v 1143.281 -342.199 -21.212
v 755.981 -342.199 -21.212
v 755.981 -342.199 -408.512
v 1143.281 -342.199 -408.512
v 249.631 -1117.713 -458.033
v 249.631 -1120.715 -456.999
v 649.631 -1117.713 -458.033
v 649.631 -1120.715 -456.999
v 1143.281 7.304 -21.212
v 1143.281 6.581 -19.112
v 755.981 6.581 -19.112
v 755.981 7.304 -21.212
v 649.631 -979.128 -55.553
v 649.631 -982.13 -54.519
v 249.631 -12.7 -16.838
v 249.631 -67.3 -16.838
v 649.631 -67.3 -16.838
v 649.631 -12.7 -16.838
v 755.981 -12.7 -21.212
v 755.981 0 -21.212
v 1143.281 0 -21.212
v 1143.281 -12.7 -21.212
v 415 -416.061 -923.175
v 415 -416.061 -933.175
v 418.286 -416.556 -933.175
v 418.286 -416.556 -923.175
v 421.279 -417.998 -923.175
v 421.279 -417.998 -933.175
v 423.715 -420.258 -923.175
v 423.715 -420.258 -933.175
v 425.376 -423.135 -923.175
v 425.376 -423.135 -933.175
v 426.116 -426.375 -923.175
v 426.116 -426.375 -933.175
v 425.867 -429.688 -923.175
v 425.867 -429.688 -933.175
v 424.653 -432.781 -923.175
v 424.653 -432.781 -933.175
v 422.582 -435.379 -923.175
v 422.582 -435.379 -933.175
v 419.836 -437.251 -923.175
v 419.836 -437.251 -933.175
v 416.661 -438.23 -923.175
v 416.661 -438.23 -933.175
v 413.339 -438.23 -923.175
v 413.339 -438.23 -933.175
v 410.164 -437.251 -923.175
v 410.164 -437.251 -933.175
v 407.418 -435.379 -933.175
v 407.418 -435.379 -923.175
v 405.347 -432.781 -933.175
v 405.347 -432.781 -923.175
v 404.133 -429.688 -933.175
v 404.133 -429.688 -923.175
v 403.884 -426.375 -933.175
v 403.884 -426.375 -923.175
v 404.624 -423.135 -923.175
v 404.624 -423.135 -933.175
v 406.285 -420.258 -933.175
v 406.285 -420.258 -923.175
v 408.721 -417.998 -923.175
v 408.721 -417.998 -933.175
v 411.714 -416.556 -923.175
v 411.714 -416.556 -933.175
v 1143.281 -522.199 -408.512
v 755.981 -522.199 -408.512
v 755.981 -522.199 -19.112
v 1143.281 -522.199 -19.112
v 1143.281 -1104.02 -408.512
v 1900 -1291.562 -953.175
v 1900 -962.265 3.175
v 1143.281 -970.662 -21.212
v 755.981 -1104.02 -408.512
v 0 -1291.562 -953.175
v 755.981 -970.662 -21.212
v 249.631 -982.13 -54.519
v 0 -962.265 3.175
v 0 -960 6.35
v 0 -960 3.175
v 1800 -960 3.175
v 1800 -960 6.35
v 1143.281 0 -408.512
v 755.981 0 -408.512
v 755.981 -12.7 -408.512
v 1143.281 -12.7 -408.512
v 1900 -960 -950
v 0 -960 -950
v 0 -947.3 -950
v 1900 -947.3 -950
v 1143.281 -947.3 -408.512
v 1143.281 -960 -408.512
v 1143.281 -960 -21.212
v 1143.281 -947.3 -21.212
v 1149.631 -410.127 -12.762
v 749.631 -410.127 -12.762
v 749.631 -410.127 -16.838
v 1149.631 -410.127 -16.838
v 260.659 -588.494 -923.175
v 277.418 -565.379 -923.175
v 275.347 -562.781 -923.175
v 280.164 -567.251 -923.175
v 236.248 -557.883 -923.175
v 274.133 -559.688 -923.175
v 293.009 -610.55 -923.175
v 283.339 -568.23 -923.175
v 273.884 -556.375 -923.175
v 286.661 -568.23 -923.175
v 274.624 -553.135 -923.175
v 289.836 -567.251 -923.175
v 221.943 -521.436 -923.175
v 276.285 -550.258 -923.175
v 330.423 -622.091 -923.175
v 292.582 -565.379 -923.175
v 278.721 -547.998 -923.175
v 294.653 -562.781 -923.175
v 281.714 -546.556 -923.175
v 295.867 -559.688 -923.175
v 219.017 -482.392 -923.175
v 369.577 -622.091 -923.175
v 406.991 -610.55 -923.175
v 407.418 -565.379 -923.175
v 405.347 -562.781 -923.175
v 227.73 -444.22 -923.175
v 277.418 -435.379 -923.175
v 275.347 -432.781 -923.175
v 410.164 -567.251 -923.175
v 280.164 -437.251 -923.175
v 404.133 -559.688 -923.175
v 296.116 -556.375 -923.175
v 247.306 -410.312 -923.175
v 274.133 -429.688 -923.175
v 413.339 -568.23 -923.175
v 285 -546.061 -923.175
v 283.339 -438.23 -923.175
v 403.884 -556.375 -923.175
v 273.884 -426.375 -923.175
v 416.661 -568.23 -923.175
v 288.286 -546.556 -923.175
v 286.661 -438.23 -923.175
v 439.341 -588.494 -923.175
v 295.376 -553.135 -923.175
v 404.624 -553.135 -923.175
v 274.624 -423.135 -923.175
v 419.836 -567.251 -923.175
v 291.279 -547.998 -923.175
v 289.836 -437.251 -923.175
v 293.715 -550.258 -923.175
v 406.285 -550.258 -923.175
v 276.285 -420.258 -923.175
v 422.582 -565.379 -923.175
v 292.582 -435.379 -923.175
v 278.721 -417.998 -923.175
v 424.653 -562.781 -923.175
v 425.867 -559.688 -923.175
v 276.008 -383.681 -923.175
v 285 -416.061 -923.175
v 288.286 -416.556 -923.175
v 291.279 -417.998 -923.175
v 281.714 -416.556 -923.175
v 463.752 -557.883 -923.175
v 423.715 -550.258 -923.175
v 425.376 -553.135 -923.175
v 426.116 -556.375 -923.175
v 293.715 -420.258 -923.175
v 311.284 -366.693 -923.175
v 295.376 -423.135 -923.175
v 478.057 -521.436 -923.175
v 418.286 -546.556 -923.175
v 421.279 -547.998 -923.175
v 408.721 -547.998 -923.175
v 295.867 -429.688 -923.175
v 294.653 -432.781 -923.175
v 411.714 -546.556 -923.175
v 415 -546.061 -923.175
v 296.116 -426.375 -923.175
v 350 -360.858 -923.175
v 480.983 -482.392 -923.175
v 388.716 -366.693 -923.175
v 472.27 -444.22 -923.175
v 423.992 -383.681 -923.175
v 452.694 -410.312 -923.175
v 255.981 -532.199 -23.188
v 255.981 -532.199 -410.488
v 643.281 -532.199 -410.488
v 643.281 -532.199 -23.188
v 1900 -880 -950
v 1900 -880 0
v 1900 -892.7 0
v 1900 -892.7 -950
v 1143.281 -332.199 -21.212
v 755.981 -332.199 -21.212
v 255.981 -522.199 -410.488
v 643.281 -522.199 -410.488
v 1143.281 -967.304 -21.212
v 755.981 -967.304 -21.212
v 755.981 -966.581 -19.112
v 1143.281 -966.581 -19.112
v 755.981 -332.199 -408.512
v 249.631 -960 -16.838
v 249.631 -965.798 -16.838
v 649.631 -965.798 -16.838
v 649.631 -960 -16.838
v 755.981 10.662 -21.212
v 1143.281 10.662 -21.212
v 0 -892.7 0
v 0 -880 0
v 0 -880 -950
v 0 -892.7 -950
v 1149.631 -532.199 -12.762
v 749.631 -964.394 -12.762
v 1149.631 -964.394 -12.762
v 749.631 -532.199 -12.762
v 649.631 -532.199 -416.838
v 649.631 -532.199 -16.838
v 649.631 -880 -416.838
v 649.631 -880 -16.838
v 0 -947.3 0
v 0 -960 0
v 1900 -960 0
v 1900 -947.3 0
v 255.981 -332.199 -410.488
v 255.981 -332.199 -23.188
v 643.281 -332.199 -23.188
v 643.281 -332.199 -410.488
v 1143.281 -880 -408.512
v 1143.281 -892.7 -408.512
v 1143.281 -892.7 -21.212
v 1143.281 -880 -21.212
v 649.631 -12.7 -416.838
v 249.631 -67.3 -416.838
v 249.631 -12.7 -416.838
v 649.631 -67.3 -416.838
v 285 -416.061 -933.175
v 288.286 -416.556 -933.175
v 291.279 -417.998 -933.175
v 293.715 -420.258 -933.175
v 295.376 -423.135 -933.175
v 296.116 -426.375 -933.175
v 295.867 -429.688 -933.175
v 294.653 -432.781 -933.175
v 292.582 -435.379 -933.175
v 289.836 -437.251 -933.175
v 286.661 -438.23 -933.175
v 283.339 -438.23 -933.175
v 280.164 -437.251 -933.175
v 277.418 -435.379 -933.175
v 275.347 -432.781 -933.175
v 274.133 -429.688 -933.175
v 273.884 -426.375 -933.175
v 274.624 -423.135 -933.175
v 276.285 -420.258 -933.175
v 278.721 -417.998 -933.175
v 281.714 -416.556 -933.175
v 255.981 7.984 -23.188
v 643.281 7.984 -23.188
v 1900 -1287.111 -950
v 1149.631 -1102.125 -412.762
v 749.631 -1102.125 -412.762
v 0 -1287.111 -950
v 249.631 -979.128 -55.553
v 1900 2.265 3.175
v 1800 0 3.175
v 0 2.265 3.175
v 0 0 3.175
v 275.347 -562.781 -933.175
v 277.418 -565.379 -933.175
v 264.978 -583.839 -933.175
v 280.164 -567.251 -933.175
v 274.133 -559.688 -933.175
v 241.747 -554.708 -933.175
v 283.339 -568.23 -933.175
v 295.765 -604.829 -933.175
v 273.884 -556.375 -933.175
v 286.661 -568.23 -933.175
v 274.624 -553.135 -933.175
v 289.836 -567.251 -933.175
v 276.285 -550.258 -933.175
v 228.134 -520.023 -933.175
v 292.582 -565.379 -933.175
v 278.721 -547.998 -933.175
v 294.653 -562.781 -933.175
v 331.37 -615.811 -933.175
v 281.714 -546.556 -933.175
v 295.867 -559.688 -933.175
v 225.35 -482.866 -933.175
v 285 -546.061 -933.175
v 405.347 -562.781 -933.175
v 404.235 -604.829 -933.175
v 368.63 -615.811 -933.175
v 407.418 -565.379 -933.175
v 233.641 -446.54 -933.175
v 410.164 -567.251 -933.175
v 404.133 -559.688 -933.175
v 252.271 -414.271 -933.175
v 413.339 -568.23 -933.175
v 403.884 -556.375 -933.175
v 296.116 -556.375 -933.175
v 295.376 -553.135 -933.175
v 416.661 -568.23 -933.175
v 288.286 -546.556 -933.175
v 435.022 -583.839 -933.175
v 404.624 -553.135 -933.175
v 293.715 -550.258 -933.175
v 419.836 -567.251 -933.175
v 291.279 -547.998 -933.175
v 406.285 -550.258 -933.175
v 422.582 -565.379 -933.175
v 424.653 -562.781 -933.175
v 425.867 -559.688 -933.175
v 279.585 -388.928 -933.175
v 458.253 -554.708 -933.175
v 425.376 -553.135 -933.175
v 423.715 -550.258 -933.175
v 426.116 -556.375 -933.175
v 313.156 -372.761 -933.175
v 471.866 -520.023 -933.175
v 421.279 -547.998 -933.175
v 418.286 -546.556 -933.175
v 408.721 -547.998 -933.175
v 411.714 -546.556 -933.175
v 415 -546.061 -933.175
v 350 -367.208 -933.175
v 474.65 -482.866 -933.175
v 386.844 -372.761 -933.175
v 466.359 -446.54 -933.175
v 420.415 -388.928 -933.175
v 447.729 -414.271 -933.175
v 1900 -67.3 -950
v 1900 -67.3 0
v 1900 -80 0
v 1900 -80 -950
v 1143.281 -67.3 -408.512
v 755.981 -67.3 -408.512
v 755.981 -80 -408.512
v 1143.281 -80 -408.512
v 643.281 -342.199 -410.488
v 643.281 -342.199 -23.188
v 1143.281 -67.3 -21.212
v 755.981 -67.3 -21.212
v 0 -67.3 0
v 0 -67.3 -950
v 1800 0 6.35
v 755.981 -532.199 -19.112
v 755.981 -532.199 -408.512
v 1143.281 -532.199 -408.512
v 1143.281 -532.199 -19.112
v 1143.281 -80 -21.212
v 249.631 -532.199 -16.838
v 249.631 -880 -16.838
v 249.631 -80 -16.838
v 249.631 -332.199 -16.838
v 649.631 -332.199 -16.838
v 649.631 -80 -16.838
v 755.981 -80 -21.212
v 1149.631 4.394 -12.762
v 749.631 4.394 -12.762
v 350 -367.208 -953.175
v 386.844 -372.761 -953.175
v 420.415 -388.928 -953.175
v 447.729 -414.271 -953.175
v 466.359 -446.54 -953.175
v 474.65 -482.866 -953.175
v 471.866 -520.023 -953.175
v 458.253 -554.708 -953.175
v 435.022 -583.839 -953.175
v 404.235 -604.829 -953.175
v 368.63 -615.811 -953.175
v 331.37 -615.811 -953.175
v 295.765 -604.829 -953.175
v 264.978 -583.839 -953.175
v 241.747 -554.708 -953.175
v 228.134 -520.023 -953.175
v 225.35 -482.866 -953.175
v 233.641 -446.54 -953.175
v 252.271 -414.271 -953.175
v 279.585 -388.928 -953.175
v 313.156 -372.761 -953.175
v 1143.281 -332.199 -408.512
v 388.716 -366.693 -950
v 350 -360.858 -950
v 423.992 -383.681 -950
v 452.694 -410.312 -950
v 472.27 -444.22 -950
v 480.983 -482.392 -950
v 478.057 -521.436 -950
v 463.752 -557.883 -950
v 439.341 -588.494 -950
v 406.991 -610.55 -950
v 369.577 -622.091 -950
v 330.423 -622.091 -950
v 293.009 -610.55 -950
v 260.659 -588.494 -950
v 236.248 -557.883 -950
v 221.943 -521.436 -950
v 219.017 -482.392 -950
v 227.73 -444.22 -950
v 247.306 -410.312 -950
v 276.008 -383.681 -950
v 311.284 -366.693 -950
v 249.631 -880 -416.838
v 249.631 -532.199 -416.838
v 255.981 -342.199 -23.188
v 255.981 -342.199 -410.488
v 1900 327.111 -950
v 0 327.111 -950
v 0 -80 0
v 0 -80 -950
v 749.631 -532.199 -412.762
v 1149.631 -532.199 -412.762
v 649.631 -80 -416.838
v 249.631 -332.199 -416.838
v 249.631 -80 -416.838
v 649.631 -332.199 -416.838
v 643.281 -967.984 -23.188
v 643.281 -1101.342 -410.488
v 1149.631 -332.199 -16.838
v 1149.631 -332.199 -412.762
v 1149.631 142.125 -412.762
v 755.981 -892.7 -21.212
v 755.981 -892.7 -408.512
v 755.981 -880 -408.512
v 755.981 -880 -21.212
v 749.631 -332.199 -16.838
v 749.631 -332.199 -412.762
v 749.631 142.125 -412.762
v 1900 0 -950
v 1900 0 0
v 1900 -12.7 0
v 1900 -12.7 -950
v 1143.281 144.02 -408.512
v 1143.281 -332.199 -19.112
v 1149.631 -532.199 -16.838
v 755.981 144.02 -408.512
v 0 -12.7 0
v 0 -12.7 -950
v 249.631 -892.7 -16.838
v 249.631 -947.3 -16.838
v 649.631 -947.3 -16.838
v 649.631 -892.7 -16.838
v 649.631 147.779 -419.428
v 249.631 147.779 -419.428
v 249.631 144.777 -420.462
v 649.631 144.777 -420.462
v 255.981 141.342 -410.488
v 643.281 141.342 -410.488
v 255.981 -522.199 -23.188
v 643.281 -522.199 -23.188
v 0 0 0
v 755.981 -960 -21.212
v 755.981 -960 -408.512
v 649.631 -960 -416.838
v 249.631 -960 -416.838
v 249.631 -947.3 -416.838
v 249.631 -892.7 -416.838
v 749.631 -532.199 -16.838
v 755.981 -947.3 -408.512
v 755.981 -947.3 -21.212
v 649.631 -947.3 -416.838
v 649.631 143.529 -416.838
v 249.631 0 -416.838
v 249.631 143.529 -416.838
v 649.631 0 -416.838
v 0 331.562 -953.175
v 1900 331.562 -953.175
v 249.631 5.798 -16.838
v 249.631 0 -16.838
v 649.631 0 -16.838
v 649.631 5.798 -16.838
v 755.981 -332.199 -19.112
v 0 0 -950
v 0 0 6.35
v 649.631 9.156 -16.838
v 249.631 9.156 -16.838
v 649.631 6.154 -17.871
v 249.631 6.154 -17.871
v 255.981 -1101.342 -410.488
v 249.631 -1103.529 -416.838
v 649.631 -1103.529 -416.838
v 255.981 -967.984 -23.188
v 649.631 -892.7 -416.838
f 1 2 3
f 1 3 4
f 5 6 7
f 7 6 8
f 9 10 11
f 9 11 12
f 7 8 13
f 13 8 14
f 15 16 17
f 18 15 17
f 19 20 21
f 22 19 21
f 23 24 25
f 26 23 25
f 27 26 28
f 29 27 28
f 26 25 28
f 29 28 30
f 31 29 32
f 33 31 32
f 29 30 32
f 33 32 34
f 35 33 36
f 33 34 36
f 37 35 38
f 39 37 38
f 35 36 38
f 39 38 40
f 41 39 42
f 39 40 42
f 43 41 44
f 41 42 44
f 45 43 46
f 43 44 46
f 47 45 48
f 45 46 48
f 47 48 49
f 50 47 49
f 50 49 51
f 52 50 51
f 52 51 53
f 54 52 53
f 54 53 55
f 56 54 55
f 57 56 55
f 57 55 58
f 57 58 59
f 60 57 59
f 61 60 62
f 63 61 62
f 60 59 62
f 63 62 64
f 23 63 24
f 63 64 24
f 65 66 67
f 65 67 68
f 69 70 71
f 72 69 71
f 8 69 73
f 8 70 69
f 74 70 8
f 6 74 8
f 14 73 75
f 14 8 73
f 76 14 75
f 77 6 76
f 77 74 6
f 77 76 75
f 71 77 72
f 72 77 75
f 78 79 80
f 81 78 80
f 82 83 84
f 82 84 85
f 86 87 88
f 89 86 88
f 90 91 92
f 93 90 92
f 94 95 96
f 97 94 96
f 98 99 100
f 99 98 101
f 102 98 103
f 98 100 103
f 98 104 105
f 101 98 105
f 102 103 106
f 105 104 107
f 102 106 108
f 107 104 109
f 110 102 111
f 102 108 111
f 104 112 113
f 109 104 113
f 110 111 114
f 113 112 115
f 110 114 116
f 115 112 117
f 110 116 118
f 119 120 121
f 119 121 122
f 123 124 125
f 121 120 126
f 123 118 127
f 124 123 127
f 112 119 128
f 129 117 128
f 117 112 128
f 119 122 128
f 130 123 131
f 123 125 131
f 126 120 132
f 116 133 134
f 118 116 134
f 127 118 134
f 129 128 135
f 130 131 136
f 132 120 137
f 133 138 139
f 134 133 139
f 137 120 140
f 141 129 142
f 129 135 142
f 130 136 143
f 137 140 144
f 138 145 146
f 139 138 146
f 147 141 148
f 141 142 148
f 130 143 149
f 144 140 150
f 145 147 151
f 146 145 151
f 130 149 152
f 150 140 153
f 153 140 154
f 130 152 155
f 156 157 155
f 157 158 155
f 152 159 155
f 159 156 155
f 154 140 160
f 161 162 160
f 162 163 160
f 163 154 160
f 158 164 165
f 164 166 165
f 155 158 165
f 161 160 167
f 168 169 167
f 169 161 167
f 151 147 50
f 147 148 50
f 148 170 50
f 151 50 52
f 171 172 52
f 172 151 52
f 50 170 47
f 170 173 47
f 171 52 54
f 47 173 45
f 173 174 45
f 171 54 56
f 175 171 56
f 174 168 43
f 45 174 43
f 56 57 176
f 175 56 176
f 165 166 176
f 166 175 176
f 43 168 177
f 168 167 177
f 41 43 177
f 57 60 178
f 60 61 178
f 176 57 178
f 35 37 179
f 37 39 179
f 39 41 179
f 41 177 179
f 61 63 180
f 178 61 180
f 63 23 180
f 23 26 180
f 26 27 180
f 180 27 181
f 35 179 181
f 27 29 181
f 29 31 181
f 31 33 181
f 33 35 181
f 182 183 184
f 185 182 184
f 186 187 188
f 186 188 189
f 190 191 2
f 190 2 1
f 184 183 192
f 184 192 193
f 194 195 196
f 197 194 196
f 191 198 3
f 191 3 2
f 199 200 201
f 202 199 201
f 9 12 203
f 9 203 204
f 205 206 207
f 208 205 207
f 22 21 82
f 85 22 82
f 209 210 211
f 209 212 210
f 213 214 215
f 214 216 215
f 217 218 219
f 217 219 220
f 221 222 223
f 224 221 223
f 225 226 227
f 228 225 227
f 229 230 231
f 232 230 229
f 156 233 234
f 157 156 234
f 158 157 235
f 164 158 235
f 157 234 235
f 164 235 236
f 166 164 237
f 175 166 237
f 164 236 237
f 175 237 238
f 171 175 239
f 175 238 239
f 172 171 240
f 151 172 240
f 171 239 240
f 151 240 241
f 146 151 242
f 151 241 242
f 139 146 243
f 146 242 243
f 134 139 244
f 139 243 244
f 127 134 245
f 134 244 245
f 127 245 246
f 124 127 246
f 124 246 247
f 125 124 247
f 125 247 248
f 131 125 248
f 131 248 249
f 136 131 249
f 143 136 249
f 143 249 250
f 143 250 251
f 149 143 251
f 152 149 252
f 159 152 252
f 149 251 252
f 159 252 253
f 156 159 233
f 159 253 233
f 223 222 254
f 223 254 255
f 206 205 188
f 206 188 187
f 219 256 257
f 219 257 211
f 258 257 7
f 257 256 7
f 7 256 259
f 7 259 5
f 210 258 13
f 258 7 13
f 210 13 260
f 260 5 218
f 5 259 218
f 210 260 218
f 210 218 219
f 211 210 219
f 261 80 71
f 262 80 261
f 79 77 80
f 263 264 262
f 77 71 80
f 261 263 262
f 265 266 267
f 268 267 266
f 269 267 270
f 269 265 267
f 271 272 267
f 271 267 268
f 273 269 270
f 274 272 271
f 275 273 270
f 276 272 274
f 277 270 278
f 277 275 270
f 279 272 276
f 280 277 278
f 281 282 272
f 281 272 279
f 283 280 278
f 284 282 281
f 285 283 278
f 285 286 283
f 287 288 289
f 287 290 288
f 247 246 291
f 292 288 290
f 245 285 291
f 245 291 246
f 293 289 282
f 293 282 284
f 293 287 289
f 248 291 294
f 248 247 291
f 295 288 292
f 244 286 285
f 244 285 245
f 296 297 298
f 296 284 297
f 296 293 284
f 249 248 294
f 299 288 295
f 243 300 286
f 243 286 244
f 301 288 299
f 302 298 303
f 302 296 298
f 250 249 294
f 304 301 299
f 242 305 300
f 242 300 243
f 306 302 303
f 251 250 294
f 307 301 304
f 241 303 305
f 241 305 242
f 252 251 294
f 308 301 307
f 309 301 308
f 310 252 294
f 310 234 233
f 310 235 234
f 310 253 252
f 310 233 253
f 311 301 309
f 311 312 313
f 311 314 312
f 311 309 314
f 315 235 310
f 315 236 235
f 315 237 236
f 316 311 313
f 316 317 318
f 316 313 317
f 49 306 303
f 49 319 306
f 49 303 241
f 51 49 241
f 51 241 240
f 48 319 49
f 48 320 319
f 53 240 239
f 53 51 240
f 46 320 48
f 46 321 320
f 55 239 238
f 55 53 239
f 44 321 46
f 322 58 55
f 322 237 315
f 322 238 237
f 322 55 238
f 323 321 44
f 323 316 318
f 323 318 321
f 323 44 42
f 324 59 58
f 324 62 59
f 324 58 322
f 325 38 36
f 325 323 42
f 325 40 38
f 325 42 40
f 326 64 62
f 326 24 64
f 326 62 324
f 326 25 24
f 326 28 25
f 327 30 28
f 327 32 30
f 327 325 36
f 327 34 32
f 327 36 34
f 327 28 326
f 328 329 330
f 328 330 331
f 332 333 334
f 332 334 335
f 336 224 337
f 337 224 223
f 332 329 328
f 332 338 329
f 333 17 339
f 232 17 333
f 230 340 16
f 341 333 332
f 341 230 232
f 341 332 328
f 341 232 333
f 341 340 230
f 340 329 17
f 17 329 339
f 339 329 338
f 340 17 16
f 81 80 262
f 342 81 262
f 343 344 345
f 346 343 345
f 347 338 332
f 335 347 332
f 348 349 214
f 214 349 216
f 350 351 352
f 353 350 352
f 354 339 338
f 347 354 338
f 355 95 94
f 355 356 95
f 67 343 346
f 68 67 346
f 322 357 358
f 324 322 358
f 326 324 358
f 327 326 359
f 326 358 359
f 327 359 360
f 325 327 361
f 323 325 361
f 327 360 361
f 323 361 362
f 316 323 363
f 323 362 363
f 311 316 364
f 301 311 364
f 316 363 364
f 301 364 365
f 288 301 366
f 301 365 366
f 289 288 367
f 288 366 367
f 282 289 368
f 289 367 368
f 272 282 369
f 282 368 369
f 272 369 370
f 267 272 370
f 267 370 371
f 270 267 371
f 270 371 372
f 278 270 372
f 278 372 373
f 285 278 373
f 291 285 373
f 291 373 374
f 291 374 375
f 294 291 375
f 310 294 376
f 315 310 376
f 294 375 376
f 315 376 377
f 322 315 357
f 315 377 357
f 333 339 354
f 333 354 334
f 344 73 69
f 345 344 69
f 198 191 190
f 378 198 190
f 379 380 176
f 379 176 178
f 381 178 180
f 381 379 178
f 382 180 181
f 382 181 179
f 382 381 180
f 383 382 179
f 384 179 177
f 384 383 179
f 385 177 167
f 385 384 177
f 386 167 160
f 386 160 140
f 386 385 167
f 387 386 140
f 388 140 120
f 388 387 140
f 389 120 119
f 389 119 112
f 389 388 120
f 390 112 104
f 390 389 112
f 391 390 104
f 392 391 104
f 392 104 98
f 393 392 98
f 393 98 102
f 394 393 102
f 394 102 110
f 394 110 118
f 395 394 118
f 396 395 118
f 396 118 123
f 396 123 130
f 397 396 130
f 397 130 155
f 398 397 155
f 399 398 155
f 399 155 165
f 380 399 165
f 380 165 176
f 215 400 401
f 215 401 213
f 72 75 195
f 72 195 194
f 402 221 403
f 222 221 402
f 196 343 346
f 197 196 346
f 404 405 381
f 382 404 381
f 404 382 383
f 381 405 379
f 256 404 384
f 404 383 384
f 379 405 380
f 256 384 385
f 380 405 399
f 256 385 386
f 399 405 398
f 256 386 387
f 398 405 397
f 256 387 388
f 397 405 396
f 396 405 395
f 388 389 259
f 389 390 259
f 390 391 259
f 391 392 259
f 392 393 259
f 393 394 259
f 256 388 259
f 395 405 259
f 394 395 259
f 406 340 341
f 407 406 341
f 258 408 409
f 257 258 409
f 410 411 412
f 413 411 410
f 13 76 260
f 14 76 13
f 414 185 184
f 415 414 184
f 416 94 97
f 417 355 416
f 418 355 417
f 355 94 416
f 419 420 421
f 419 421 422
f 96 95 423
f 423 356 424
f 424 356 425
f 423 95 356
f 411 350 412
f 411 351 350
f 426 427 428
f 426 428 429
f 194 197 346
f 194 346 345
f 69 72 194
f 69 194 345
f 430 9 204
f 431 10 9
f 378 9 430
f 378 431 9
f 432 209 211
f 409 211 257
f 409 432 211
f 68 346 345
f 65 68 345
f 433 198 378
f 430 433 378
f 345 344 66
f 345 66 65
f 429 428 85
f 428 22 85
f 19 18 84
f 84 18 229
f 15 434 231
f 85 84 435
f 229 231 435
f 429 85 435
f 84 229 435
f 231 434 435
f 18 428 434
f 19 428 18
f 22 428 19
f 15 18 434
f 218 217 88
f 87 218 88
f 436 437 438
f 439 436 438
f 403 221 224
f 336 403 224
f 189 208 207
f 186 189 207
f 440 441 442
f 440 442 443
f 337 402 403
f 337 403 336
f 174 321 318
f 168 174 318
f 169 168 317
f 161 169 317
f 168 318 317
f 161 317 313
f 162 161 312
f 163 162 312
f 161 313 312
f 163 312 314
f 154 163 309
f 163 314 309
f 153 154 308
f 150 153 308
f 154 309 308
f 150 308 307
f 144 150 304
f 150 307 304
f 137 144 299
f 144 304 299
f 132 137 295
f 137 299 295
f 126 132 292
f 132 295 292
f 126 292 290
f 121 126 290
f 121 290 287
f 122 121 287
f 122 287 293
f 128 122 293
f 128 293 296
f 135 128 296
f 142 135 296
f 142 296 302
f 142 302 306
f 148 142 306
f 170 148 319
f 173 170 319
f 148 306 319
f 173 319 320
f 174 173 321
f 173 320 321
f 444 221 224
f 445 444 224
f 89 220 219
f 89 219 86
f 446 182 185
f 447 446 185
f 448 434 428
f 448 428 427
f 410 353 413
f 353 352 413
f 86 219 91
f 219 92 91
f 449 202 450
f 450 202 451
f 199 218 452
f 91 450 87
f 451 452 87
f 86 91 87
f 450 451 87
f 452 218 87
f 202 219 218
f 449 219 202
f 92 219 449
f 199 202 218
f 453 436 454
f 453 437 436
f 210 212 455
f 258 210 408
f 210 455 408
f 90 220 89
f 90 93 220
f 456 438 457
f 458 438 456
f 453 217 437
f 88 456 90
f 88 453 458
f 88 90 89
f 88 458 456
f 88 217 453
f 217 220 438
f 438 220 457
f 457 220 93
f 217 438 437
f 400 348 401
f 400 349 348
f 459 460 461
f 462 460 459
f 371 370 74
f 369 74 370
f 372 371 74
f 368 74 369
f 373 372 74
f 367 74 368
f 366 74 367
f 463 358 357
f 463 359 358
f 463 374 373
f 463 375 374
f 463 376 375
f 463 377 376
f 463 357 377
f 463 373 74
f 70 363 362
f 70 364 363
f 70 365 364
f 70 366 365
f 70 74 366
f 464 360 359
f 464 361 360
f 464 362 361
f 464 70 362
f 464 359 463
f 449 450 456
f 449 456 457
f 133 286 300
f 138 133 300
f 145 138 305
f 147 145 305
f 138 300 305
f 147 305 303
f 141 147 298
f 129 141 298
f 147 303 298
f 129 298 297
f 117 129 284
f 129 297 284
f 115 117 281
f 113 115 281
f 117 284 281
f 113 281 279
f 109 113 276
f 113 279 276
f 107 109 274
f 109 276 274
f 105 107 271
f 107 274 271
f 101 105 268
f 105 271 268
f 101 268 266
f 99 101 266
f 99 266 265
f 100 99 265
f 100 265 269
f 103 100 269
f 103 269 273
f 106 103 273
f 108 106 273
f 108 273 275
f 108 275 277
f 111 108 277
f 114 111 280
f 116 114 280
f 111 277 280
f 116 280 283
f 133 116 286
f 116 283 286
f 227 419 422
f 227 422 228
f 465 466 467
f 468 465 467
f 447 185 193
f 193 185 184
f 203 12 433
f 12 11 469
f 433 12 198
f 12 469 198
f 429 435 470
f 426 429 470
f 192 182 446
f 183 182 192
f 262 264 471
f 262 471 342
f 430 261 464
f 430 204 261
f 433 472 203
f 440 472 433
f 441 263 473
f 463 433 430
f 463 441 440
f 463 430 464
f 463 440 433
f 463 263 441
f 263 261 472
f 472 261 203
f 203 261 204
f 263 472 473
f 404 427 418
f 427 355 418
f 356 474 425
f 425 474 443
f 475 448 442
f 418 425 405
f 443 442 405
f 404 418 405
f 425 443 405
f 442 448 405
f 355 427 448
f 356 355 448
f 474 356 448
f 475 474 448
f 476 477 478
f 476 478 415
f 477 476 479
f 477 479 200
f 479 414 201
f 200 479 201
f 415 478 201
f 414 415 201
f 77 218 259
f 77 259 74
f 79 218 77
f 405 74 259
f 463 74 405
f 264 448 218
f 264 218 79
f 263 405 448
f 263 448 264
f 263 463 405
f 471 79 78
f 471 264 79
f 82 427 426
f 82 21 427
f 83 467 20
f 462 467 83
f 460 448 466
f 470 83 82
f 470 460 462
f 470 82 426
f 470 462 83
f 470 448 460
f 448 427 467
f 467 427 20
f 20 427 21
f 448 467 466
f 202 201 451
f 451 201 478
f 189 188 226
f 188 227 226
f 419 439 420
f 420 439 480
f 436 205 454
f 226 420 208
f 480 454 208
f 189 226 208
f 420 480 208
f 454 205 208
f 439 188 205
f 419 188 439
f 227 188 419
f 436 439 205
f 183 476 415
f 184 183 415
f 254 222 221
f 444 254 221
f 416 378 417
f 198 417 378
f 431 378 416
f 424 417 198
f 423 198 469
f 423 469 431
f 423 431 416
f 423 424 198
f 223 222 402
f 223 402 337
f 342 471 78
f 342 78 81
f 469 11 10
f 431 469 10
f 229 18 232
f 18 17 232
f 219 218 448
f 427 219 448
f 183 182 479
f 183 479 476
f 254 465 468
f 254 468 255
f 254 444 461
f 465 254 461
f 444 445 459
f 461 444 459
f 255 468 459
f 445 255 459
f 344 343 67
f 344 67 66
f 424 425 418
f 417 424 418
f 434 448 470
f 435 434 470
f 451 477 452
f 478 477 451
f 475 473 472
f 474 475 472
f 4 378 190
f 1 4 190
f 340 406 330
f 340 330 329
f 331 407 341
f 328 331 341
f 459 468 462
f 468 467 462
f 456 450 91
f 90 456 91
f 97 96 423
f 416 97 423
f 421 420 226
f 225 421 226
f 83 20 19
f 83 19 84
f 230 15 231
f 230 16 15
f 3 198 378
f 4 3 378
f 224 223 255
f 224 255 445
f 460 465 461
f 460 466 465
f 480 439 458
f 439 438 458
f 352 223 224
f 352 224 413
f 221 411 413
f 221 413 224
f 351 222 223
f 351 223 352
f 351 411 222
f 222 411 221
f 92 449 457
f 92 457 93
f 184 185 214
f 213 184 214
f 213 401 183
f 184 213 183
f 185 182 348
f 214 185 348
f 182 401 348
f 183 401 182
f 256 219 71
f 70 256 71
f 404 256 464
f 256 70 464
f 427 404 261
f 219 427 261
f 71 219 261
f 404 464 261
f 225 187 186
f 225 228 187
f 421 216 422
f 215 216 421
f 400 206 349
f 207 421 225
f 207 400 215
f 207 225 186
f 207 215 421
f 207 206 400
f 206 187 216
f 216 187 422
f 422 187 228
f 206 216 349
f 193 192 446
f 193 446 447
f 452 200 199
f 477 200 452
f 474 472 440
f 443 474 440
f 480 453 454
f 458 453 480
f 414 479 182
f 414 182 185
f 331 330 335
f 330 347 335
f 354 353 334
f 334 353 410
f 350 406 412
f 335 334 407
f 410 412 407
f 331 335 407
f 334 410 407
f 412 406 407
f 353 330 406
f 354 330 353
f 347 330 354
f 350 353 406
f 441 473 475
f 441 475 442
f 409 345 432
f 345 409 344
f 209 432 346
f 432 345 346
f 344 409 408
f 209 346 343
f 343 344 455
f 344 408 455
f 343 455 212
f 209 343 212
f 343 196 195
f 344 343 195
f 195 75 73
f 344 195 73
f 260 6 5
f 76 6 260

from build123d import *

# Parameters (mm, degrees)
SKETCH1_W                       = 1800
SKETCH1_H                       = 960
BOSS_EXTRUDE1_DEPTH             = 6.35
BOSS_EXTRUDE2_DEPTH             = 1900
SKETCH6_W                       = 400
SKETCH6_H                       = 425.788292868
CUT_EXTRUDE1_DEPTH              = 300
SKETCH7_W                       = 400
SKETCH7_H                       = 425.67110899
CUT_EXTRUDE2_DEPTH              = 300
BOSS_EXTRUDE4_REACH             = 2489.303
SKETCH8_W                       = 400
SKETCH8_H                       = 400
SKETCH8_W_2                     = 387.3
SKETCH8_H_2                     = 387.3
BOSS_EXTRUDE4_DIRECTION_2_REACH = 2489.303
SKETCH11_R                      = 131.35
BOSS_EXTRUDE6_DEPTH             = 30
SKETCH12_R                      = 125
CUT_EXTRUDE5_DEPTH              = 20
BOSS_EXTRUDE7_REACH             = 2489.303
SKETCH14_W                      = 400
SKETCH14_H                      = 400
SKETCH14_W_2                    = 387.3
SKETCH14_H_2                    = 387.3
BOSS_EXTRUDE7_DIRECTION_2_REACH = 2489.303
CUT_EXTRUDE6_START              = -1104.02001
SKETCH15_W                      = 387.3
SKETCH15_H                      = 387.3
CUT_EXTRUDE6_DEPTH              = 1248.04002
SKETCH16_W                      = 400
SKETCH16_H                      = 200
CUT_EXTRUDE8_DEPTH              = 940
SKETCH18_W                      = 4.075824643
SKETCH18_H                      = 122.071298875
CUT_EXTRUDE9_DEPTH              = 410
SKETCH19_W                      = 387.3
SKETCH19_H                      = 387.3
BOSS_EXTRUDE22_DEPTH            = 10
SKETCH22_W                      = 387.3
SKETCH22_H                      = 389.400481364
BOSS_EXTRUDE24_DEPTH            = 10
SKETCH23_W                      = 387.3
SKETCH23_H                      = 387.3
BOSS_EXTRUDE25_DEPTH            = 10
SKETCH24_W                      = 387.3
SKETCH24_H                      = 387.3
BOSS_EXTRUDE26_DEPTH            = 10
SKETCH25_W                      = 950
SKETCH25_H                      = 12.7
BOSS_EXTRUDE27_DEPTH            = 1900
SKETCH26_W                      = 387.3
SKETCH26_H                      = 387.3
CUT_EXTRUDE10_DEPTH             = 300
SKETCH27_W                      = 387.3
SKETCH27_H                      = 387.3
CUT_EXTRUDE11_DEPTH             = 300
SKETCH28_W                      = 387.3
SKETCH28_H                      = 387.3
CUT_EXTRUDE12_DEPTH             = 300
SKETCH29_W                      = 387.3
SKETCH29_H                      = 387.3
CUT_EXTRUDE13_DEPTH             = 300
SKETCH30_R                      = 11.146802018
CUT_EXTRUDE14_DEPTH             = 10


with BuildPart() as part:
    # Sketch1 → Boss-Extrude1 (new body)
    with BuildSketch(Plane.XY):
        with Locations((900, -480)):
            Rectangle(SKETCH1_W, SKETCH1_H)
    extrude(amount=BOSS_EXTRUDE1_DEPTH)

    # Sketch2 → Boss-Extrude2 (add)
    with BuildSketch(Plane(origin=(0, 0, 0), x_dir=(0, 0, -1), z_dir=(1, 0, 0))):
        Polygon((-3.175, -962.264705491), (-3.175, 2.264705491), (953.175, 331.56241846), (953.175, -1291.56241846), align=None)
        Polygon((0, 0), (950, 327.111232625), (950, -1287.111232625), (0, -960), align=None, mode=Mode.SUBTRACT)
    extrude(amount=BOSS_EXTRUDE2_DEPTH)

    # Sketch6 → Cut-Extrude1 (cut)
    with BuildSketch(Plane(origin=(0, 3.002021478, 1.03367889), x_dir=(1, 0, 0), z_dir=(0, 0.9455185755993153, 0.32556815445716086))):
        with Locations((449.631164922, 231.795224093)):
            Rectangle(SKETCH6_W, SKETCH6_H)
    extrude(amount=-CUT_EXTRUDE1_DEPTH, mode=Mode.SUBTRACT)

    # Sketch7 → Cut-Extrude2 (cut)
    with BuildSketch(Plane(origin=(0, -861.247183209, 296.551187047), x_dir=(1, 0, 0), z_dir=(0, -0.9455185755993154, 0.32556815445716053))):
        with Locations((449.631164922, -584.134563657)):
            Rectangle(SKETCH7_W, SKETCH7_H)
    extrude(amount=-CUT_EXTRUDE2_DEPTH, mode=Mode.SUBTRACT)

    # Sketch11 → Boss-Extrude6 (add)
    with BuildSketch(Plane(origin=(0, 0, -953.175), x_dir=(-1, 0, 0), z_dir=(0, 0, -1))):
        with Locations(Location((-350, -492.20758154, 0), (0, 0, 90))):
            Circle(SKETCH11_R)
    extrude(amount=-BOSS_EXTRUDE6_DEPTH)

    # Sketch12 → Cut-Extrude5 (cut)
    with BuildSketch(Plane(origin=(0, 0, -953.175), x_dir=(-1, 0, 0), z_dir=(0, 0, -1))):
        with Locations(Location((-350, -492.20758154, 0), (0, 0, 90))):
            Circle(SKETCH12_R)
    extrude(amount=-CUT_EXTRUDE5_DEPTH, mode=Mode.SUBTRACT)

    # Boss-Extrude7: up to this plane
    boss_extrude7_end = Plane(origin=(1900, 0, 0), z_dir=(0, -0.9455185755993153, -0.325568154457161))
    # Sketch14 → Boss-Extrude7 (add, up to the surface)
    with BuildSketch(Plane(origin=(0, 0, 0), x_dir=(1, 0, 0), z_dir=(0, 1, 0)), mode=Mode.PRIVATE) as boss_extrude7_sk1:
        with Locations((949.631164922, 212.761816492)):
            Rectangle(SKETCH14_W, SKETCH14_H)
        with Locations((949.631164922, 212.761816492)):
            Rectangle(SKETCH14_W_2, SKETCH14_H_2, mode=Mode.SUBTRACT)
    boss_extrude7_tool1 = split(extrude(boss_extrude7_sk1.sketch, amount=BOSS_EXTRUDE7_REACH, mode=Mode.PRIVATE), bisect_by=boss_extrude7_end, keep=Keep.BOTH, mode=Mode.PRIVATE)
    add(boss_extrude7_tool1.solids().sort_by_distance((949.631165, 0, -407.104962))[0])

    # Boss-Extrude7 direction 2: up to this plane
    boss_extrude7_direction_2_end = Plane(origin=(1900, -1287.111232625, -950), z_dir=(0, 0.9455185755993156, -0.3255681544571603))
    # Sketch14 → Boss-Extrude7 direction 2 (add, up to the surface)
    with BuildSketch(Plane(origin=(0, 0, 0), x_dir=(1, 0, 0), z_dir=(0, 1, 0)), mode=Mode.PRIVATE) as boss_extrude7_direction_2_sk1:
        with Locations((949.631164922, 212.761816492)):
            Rectangle(SKETCH14_W, SKETCH14_H)
        with Locations((949.631164922, 212.761816492)):
            Rectangle(SKETCH14_W_2, SKETCH14_H_2, mode=Mode.SUBTRACT)
    boss_extrude7_direction_2_tool1 = split(extrude(boss_extrude7_direction_2_sk1.sketch, amount=-BOSS_EXTRUDE7_DIRECTION_2_REACH, mode=Mode.PRIVATE), bisect_by=boss_extrude7_direction_2_end, keep=Keep.BOTH, mode=Mode.PRIVATE)
    add(boss_extrude7_direction_2_tool1.solids().sort_by_distance((949.631165, 0, -407.104962))[0])

    # Sketch15 → Cut-Extrude6 (cut)
    with BuildSketch(Plane(origin=(0, 0, 0), x_dir=(1, 0, 0), z_dir=(0, 1, 0)).offset(CUT_EXTRUDE6_START)):
        with Locations((949.631164922, 214.862297856)):
            Rectangle(SKETCH15_W, SKETCH15_H)
    extrude(amount=CUT_EXTRUDE6_DEPTH, mode=Mode.SUBTRACT)


with BuildPart() as body_2:
    # Boss-Extrude4: up to this plane
    boss_extrude4_end = Plane(origin=(1900, -1287.111232625, -950), z_dir=(0, 0.9455185755993156, -0.3255681544571603))
    # Sketch8 → Boss-Extrude4 (new, up to the surface)
    with BuildSketch(Plane(origin=(0, 0, 0), x_dir=(1, 0, 0), z_dir=(0, 1, 0)), mode=Mode.PRIVATE) as boss_extrude4_sk1:
        with Locations((449.631164922, 216.837641135)):
            Rectangle(SKETCH8_W, SKETCH8_H)
        with Locations((449.631164922, 216.837641135)):
            Rectangle(SKETCH8_W_2, SKETCH8_H_2, mode=Mode.SUBTRACT)
    boss_extrude4_tool1 = split(extrude(boss_extrude4_sk1.sketch, amount=-BOSS_EXTRUDE4_REACH, mode=Mode.PRIVATE), bisect_by=boss_extrude4_end, keep=Keep.BOTH, mode=Mode.PRIVATE)
    add(boss_extrude4_tool1.solids().sort_by_distance((449.631165, 0, -22.494495))[0])

    # Boss-Extrude4 direction 2: up to this plane
    boss_extrude4_direction_2_end = Plane(origin=(1900, 0, 0), z_dir=(0, -0.9455185755993153, -0.325568154457161))
    # Sketch8 → Boss-Extrude4 direction 2 (add, up to the surface)
    with BuildSketch(Plane(origin=(0, 0, 0), x_dir=(1, 0, 0), z_dir=(0, 1, 0)), mode=Mode.PRIVATE) as boss_extrude4_direction_2_sk1:
        with Locations((449.631164922, 216.837641135)):
            Rectangle(SKETCH8_W, SKETCH8_H)
        with Locations((449.631164922, 216.837641135)):
            Rectangle(SKETCH8_W_2, SKETCH8_H_2, mode=Mode.SUBTRACT)
    boss_extrude4_direction_2_tool1 = split(extrude(boss_extrude4_direction_2_sk1.sketch, amount=BOSS_EXTRUDE4_DIRECTION_2_REACH, mode=Mode.PRIVATE), bisect_by=boss_extrude4_direction_2_end, keep=Keep.BOTH, mode=Mode.PRIVATE)
    add(boss_extrude4_direction_2_tool1.solids().sort_by_distance((449.631165, 0, -22.494495))[0])


with BuildPart() as cut_extrude8_tool:
    # Sketch16 → Cut-Extrude8 (new body)
    with BuildSketch(Plane.ZY.offset(-249.631164922)):
        with Locations((-216.837641135, -432.198710101)):
            Rectangle(SKETCH16_W, SKETCH16_H)
    extrude(amount=-CUT_EXTRUDE8_DEPTH)


with BuildPart() as part_1:
    add(part.part)

    # Cut-Extrude8: cut by cut_extrude8_tool
    add(cut_extrude8_tool.part, mode=Mode.SUBTRACT)

    # Sketch18 → Cut-Extrude9 (cut)
    with BuildSketch(Plane(origin=(1149.631164922, 0, 0), x_dir=(0, 0, -1), z_dir=(1, 0, 0))):
        with Locations((14.799728814, -471.163060664)):
            Rectangle(SKETCH18_W, SKETCH18_H)
    extrude(amount=-CUT_EXTRUDE9_DEPTH, mode=Mode.SUBTRACT)

    # Sketch30 → Cut-Extrude14 (cut)
    with BuildSketch(Plane(origin=(0, 0, -933.175), x_dir=(-1, 0, 0), z_dir=(0, 0, -1))):
        with Locations(Location((-285, -427.20758154, 0), (0, 0, 90))):
            Circle(SKETCH30_R)
        with Locations(Location((-415, -427.20758154, 0), (0, 0, 90))):
            Circle(SKETCH30_R)
        with Locations(Location((-415, -557.20758154, 0), (0, 0, 90))):
            Circle(SKETCH30_R)
        with Locations(Location((-285, -557.20758154, 0), (0, 0, 90))):
            Circle(SKETCH30_R)
    extrude(amount=-CUT_EXTRUDE14_DEPTH, mode=Mode.SUBTRACT)


with BuildPart() as body_2_1:
    add(body_2.part)

    # Cut-Extrude8: cut by cut_extrude8_tool
    add(cut_extrude8_tool.part, mode=Mode.SUBTRACT)

    # Sketch25 → Boss-Extrude27 (add)
    with BuildSketch(Plane(origin=(0, 0, 0), x_dir=(0, 0, -1), z_dir=(1, 0, 0))):
        with Locations((475, -953.65)):
            Rectangle(SKETCH25_W, SKETCH25_H)
        with Locations((475, -886.35)):
            Rectangle(SKETCH25_W, SKETCH25_H)
        with Locations((475, -73.65)):
            Rectangle(SKETCH25_W, SKETCH25_H)
        with Locations((475, -6.35)):
            Rectangle(SKETCH25_W, SKETCH25_H)
    extrude(amount=BOSS_EXTRUDE27_DEPTH)

    # Sketch26 → Cut-Extrude10 (cut)
    with BuildSketch(Plane(origin=(0, 0, 0), x_dir=(1, 0, 0), z_dir=(0, 1, 0))):
        with Locations((449.631164922, 216.837641135)):
            Rectangle(SKETCH26_W, SKETCH26_H)
    extrude(amount=-CUT_EXTRUDE10_DEPTH, mode=Mode.SUBTRACT)

    # Sketch27 → Cut-Extrude11 (cut)
    with BuildSketch(Plane(origin=(0, 0, 0), x_dir=(1, 0, 0), z_dir=(0, 1, 0))):
        with Locations((949.631164922, 214.862297856)):
            Rectangle(SKETCH27_W, SKETCH27_H)
    extrude(amount=-CUT_EXTRUDE11_DEPTH, mode=Mode.SUBTRACT)

    # Sketch28 → Cut-Extrude12 (cut)
    with BuildSketch(Plane.XZ.offset(960)):
        with Locations((949.631164922, -214.862297856)):
            Rectangle(SKETCH28_W, SKETCH28_H)
    extrude(amount=-CUT_EXTRUDE12_DEPTH, mode=Mode.SUBTRACT)

    # Sketch29 → Cut-Extrude13 (cut)
    with BuildSketch(Plane.XZ.offset(960)):
        with Locations((449.631164922, -216.837641135)):
            Rectangle(SKETCH29_W, SKETCH29_H)
    extrude(amount=-CUT_EXTRUDE13_DEPTH, mode=Mode.SUBTRACT)


with BuildPart() as body_3:
    # Sketch19 → Boss-Extrude22 (new body)
    with BuildSketch(Plane.XZ.offset(332.198710101)):
        with Locations((949.631164922, -214.862297856)):
            Rectangle(SKETCH19_W, SKETCH19_H)
    extrude(amount=BOSS_EXTRUDE22_DEPTH)


with BuildPart() as body_4:
    # Sketch22 → Boss-Extrude24 (new body)
    with BuildSketch(Plane(origin=(0, -532.198710101, 0), x_dir=(1, 0, 0), z_dir=(0, 1, 0))):
        with Locations((949.631164922, 213.812057174)):
            Rectangle(SKETCH22_W, SKETCH22_H)
    extrude(amount=BOSS_EXTRUDE24_DEPTH)


with BuildPart() as body_5:
    # Sketch23 → Boss-Extrude25 (new body)
    with BuildSketch(Plane(origin=(0, -532.198710101, 0), x_dir=(1, 0, 0), z_dir=(0, 1, 0))):
        with Locations((449.631164922, 216.837641135)):
            Rectangle(SKETCH23_W, SKETCH23_H)
    extrude(amount=BOSS_EXTRUDE25_DEPTH)


with BuildPart() as body_6:
    # Sketch24 → Boss-Extrude26 (new body)
    with BuildSketch(Plane.XZ.offset(332.198710101)):
        with Locations((449.631164922, -216.837641135)):
            Rectangle(SKETCH24_W, SKETCH24_H)
    extrude(amount=BOSS_EXTRUDE26_DEPTH)


solid = Compound([part_1.part, body_2_1.part, body_3.part, body_4.part, body_5.part, body_6.part])
